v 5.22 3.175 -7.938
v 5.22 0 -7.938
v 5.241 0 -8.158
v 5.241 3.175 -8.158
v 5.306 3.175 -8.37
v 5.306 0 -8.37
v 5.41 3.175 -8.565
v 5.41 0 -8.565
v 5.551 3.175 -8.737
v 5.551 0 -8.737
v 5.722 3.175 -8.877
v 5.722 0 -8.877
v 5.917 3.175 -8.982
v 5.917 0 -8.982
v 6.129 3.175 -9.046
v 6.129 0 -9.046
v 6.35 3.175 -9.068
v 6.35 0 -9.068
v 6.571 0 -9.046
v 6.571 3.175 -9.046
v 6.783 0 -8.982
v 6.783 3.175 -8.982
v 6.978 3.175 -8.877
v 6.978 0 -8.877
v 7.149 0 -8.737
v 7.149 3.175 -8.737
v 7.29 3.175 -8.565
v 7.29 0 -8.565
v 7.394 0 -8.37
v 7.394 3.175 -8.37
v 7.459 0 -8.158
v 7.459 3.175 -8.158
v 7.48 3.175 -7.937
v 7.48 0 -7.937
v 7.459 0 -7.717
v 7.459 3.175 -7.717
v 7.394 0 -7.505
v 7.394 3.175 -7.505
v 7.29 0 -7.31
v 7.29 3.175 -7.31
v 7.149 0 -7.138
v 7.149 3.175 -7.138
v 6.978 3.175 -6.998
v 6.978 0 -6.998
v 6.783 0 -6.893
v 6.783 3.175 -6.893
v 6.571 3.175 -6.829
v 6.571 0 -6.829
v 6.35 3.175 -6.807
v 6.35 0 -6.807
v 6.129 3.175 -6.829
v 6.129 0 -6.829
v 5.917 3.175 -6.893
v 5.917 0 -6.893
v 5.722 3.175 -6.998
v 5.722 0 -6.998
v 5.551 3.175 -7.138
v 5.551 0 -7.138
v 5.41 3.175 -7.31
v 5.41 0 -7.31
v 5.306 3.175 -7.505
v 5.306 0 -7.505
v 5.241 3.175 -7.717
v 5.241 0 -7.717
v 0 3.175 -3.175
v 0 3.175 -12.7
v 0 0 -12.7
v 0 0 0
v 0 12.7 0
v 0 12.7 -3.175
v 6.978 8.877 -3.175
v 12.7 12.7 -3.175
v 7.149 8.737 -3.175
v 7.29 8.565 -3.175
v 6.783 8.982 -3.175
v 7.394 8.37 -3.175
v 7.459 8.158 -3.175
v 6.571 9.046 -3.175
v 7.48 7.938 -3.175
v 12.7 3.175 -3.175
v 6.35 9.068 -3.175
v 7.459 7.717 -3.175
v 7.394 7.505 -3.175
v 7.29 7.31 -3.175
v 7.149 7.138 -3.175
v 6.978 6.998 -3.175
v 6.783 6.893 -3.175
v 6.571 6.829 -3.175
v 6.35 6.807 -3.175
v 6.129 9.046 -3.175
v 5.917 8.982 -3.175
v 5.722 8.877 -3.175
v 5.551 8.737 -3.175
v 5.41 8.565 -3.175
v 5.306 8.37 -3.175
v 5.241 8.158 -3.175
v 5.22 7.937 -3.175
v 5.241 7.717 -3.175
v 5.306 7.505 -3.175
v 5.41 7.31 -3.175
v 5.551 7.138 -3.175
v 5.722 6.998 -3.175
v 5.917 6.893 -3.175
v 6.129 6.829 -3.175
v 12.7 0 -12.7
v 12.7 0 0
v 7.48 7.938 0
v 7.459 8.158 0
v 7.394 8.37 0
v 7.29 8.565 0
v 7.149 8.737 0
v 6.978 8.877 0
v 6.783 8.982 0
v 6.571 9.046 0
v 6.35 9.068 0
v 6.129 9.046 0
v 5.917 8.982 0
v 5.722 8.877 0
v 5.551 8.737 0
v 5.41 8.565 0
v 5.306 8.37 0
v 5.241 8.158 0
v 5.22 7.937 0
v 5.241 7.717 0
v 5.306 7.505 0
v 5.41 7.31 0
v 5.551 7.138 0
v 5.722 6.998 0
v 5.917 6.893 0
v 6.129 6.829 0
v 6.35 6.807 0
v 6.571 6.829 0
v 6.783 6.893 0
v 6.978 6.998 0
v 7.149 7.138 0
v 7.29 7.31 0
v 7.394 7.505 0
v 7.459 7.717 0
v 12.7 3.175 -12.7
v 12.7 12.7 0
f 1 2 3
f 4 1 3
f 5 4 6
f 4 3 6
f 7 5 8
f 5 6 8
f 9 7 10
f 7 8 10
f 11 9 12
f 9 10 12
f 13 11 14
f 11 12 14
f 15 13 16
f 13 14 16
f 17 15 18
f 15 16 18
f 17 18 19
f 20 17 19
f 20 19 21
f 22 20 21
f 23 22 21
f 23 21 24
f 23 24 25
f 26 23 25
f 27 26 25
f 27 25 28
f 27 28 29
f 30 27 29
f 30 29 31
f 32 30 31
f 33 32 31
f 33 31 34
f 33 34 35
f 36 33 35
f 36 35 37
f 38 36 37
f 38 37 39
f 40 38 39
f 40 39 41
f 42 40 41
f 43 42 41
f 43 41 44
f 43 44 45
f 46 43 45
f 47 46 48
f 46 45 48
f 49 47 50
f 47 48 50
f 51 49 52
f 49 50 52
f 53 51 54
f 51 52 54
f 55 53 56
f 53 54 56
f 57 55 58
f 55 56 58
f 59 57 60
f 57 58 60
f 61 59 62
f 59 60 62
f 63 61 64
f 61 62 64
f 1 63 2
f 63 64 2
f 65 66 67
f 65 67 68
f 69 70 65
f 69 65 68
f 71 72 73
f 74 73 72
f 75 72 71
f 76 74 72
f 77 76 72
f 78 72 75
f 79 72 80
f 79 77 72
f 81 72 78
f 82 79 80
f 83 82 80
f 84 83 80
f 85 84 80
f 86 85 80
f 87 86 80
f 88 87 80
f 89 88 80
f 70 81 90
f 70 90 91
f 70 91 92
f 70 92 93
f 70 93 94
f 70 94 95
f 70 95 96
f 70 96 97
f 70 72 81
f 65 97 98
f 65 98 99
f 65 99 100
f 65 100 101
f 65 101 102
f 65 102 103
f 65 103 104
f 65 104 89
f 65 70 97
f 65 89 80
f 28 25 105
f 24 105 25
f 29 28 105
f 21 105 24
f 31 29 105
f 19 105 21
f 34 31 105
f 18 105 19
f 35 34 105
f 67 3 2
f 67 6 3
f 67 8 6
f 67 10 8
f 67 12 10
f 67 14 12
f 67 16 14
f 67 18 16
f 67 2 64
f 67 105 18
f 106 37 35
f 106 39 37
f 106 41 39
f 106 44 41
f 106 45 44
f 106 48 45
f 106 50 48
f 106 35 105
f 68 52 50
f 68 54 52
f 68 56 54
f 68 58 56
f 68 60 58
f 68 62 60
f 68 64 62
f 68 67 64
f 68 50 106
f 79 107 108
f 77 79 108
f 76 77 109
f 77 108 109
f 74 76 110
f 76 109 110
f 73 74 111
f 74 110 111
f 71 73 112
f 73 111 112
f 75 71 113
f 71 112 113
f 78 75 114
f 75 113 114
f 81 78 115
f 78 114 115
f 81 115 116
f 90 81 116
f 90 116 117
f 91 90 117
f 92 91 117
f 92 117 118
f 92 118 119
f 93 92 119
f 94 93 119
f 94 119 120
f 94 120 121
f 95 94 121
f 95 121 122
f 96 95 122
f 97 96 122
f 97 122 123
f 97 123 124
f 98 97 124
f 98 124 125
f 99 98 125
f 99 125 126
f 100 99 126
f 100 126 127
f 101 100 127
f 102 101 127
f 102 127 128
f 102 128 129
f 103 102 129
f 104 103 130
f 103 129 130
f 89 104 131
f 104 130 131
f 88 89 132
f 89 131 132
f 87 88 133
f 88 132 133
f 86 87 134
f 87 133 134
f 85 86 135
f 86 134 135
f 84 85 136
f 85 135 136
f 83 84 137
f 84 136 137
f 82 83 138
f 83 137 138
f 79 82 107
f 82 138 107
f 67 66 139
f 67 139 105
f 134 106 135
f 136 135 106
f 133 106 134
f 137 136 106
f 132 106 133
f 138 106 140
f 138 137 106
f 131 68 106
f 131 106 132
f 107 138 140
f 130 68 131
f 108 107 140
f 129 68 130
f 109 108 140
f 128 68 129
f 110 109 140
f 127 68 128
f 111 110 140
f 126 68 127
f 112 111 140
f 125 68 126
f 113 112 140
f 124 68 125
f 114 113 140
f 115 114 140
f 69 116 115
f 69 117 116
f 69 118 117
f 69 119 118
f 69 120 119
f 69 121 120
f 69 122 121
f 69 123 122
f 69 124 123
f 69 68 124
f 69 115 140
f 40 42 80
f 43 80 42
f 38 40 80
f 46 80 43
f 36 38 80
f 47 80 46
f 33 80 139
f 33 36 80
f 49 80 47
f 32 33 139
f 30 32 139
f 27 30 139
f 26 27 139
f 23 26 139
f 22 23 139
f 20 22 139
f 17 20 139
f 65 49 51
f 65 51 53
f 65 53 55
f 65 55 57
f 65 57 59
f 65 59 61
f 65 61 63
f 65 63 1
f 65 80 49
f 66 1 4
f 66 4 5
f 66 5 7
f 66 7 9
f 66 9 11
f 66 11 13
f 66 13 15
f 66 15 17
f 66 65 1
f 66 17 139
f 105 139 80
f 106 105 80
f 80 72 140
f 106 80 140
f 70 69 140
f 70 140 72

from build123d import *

# Parameters (mm, degrees)
BOSS_EXTRUDE1_DEPTH             = 12.7
F_43_0_089_DIAMETER_HOLE1_D     = 2.2606
F_43_0_089_DIAMETER_HOLE1_DEPTH = 25.4
F_43_0_089_DIAMETER_HOLE1_TIP   = 0.679152758
F_43_0_089_DIAMETER_HOLE2_D     = 2.2606
F_43_0_089_DIAMETER_HOLE2_DEPTH = 25.4
F_43_0_089_DIAMETER_HOLE2_TIP   = 0.679152758


with BuildPart() as part:
    # Sketch1 → Boss-Extrude1 (new body)
    with BuildSketch(Plane(origin=(0, 0, 0), x_dir=(0, 0, -1), z_dir=(1, 0, 0))):
        Polygon((0, 0), (0, 12.7), (3.175, 12.7), (3.175, 3.175), (12.7, 3.175), (12.7, 0), align=None)
    extrude(amount=BOSS_EXTRUDE1_DEPTH)

    # #43 (0.089) Diameter Hole1
    with Locations(Plane(origin=(0, 0, -3.175), x_dir=(-1, 0, 0), z_dir=(0, 0, -1))):
        with Locations((-6.35, 7.9375)):
            Hole(F_43_0_089_DIAMETER_HOLE1_D / 2, depth=F_43_0_089_DIAMETER_HOLE1_DEPTH)
            with Locations((0, 0, -(F_43_0_089_DIAMETER_HOLE1_DEPTH + F_43_0_089_DIAMETER_HOLE1_TIP / 2))):  # 118° drill point
                Cone(0, F_43_0_089_DIAMETER_HOLE1_D / 2, F_43_0_089_DIAMETER_HOLE1_TIP, mode=Mode.SUBTRACT)

    # #43 (0.089) Diameter Hole2
    with Locations(Plane(origin=(0, 3.175, 0), x_dir=(1, 0, 0), z_dir=(0, 1, 0))):
        with Locations((6.35, 7.9375)):
            Hole(F_43_0_089_DIAMETER_HOLE2_D / 2, depth=F_43_0_089_DIAMETER_HOLE2_DEPTH)
            with Locations((0, 0, -(F_43_0_089_DIAMETER_HOLE2_DEPTH + F_43_0_089_DIAMETER_HOLE2_TIP / 2))):  # 118° drill point
                Cone(0, F_43_0_089_DIAMETER_HOLE2_D / 2, F_43_0_089_DIAMETER_HOLE2_TIP, mode=Mode.SUBTRACT)


solid = part.part
